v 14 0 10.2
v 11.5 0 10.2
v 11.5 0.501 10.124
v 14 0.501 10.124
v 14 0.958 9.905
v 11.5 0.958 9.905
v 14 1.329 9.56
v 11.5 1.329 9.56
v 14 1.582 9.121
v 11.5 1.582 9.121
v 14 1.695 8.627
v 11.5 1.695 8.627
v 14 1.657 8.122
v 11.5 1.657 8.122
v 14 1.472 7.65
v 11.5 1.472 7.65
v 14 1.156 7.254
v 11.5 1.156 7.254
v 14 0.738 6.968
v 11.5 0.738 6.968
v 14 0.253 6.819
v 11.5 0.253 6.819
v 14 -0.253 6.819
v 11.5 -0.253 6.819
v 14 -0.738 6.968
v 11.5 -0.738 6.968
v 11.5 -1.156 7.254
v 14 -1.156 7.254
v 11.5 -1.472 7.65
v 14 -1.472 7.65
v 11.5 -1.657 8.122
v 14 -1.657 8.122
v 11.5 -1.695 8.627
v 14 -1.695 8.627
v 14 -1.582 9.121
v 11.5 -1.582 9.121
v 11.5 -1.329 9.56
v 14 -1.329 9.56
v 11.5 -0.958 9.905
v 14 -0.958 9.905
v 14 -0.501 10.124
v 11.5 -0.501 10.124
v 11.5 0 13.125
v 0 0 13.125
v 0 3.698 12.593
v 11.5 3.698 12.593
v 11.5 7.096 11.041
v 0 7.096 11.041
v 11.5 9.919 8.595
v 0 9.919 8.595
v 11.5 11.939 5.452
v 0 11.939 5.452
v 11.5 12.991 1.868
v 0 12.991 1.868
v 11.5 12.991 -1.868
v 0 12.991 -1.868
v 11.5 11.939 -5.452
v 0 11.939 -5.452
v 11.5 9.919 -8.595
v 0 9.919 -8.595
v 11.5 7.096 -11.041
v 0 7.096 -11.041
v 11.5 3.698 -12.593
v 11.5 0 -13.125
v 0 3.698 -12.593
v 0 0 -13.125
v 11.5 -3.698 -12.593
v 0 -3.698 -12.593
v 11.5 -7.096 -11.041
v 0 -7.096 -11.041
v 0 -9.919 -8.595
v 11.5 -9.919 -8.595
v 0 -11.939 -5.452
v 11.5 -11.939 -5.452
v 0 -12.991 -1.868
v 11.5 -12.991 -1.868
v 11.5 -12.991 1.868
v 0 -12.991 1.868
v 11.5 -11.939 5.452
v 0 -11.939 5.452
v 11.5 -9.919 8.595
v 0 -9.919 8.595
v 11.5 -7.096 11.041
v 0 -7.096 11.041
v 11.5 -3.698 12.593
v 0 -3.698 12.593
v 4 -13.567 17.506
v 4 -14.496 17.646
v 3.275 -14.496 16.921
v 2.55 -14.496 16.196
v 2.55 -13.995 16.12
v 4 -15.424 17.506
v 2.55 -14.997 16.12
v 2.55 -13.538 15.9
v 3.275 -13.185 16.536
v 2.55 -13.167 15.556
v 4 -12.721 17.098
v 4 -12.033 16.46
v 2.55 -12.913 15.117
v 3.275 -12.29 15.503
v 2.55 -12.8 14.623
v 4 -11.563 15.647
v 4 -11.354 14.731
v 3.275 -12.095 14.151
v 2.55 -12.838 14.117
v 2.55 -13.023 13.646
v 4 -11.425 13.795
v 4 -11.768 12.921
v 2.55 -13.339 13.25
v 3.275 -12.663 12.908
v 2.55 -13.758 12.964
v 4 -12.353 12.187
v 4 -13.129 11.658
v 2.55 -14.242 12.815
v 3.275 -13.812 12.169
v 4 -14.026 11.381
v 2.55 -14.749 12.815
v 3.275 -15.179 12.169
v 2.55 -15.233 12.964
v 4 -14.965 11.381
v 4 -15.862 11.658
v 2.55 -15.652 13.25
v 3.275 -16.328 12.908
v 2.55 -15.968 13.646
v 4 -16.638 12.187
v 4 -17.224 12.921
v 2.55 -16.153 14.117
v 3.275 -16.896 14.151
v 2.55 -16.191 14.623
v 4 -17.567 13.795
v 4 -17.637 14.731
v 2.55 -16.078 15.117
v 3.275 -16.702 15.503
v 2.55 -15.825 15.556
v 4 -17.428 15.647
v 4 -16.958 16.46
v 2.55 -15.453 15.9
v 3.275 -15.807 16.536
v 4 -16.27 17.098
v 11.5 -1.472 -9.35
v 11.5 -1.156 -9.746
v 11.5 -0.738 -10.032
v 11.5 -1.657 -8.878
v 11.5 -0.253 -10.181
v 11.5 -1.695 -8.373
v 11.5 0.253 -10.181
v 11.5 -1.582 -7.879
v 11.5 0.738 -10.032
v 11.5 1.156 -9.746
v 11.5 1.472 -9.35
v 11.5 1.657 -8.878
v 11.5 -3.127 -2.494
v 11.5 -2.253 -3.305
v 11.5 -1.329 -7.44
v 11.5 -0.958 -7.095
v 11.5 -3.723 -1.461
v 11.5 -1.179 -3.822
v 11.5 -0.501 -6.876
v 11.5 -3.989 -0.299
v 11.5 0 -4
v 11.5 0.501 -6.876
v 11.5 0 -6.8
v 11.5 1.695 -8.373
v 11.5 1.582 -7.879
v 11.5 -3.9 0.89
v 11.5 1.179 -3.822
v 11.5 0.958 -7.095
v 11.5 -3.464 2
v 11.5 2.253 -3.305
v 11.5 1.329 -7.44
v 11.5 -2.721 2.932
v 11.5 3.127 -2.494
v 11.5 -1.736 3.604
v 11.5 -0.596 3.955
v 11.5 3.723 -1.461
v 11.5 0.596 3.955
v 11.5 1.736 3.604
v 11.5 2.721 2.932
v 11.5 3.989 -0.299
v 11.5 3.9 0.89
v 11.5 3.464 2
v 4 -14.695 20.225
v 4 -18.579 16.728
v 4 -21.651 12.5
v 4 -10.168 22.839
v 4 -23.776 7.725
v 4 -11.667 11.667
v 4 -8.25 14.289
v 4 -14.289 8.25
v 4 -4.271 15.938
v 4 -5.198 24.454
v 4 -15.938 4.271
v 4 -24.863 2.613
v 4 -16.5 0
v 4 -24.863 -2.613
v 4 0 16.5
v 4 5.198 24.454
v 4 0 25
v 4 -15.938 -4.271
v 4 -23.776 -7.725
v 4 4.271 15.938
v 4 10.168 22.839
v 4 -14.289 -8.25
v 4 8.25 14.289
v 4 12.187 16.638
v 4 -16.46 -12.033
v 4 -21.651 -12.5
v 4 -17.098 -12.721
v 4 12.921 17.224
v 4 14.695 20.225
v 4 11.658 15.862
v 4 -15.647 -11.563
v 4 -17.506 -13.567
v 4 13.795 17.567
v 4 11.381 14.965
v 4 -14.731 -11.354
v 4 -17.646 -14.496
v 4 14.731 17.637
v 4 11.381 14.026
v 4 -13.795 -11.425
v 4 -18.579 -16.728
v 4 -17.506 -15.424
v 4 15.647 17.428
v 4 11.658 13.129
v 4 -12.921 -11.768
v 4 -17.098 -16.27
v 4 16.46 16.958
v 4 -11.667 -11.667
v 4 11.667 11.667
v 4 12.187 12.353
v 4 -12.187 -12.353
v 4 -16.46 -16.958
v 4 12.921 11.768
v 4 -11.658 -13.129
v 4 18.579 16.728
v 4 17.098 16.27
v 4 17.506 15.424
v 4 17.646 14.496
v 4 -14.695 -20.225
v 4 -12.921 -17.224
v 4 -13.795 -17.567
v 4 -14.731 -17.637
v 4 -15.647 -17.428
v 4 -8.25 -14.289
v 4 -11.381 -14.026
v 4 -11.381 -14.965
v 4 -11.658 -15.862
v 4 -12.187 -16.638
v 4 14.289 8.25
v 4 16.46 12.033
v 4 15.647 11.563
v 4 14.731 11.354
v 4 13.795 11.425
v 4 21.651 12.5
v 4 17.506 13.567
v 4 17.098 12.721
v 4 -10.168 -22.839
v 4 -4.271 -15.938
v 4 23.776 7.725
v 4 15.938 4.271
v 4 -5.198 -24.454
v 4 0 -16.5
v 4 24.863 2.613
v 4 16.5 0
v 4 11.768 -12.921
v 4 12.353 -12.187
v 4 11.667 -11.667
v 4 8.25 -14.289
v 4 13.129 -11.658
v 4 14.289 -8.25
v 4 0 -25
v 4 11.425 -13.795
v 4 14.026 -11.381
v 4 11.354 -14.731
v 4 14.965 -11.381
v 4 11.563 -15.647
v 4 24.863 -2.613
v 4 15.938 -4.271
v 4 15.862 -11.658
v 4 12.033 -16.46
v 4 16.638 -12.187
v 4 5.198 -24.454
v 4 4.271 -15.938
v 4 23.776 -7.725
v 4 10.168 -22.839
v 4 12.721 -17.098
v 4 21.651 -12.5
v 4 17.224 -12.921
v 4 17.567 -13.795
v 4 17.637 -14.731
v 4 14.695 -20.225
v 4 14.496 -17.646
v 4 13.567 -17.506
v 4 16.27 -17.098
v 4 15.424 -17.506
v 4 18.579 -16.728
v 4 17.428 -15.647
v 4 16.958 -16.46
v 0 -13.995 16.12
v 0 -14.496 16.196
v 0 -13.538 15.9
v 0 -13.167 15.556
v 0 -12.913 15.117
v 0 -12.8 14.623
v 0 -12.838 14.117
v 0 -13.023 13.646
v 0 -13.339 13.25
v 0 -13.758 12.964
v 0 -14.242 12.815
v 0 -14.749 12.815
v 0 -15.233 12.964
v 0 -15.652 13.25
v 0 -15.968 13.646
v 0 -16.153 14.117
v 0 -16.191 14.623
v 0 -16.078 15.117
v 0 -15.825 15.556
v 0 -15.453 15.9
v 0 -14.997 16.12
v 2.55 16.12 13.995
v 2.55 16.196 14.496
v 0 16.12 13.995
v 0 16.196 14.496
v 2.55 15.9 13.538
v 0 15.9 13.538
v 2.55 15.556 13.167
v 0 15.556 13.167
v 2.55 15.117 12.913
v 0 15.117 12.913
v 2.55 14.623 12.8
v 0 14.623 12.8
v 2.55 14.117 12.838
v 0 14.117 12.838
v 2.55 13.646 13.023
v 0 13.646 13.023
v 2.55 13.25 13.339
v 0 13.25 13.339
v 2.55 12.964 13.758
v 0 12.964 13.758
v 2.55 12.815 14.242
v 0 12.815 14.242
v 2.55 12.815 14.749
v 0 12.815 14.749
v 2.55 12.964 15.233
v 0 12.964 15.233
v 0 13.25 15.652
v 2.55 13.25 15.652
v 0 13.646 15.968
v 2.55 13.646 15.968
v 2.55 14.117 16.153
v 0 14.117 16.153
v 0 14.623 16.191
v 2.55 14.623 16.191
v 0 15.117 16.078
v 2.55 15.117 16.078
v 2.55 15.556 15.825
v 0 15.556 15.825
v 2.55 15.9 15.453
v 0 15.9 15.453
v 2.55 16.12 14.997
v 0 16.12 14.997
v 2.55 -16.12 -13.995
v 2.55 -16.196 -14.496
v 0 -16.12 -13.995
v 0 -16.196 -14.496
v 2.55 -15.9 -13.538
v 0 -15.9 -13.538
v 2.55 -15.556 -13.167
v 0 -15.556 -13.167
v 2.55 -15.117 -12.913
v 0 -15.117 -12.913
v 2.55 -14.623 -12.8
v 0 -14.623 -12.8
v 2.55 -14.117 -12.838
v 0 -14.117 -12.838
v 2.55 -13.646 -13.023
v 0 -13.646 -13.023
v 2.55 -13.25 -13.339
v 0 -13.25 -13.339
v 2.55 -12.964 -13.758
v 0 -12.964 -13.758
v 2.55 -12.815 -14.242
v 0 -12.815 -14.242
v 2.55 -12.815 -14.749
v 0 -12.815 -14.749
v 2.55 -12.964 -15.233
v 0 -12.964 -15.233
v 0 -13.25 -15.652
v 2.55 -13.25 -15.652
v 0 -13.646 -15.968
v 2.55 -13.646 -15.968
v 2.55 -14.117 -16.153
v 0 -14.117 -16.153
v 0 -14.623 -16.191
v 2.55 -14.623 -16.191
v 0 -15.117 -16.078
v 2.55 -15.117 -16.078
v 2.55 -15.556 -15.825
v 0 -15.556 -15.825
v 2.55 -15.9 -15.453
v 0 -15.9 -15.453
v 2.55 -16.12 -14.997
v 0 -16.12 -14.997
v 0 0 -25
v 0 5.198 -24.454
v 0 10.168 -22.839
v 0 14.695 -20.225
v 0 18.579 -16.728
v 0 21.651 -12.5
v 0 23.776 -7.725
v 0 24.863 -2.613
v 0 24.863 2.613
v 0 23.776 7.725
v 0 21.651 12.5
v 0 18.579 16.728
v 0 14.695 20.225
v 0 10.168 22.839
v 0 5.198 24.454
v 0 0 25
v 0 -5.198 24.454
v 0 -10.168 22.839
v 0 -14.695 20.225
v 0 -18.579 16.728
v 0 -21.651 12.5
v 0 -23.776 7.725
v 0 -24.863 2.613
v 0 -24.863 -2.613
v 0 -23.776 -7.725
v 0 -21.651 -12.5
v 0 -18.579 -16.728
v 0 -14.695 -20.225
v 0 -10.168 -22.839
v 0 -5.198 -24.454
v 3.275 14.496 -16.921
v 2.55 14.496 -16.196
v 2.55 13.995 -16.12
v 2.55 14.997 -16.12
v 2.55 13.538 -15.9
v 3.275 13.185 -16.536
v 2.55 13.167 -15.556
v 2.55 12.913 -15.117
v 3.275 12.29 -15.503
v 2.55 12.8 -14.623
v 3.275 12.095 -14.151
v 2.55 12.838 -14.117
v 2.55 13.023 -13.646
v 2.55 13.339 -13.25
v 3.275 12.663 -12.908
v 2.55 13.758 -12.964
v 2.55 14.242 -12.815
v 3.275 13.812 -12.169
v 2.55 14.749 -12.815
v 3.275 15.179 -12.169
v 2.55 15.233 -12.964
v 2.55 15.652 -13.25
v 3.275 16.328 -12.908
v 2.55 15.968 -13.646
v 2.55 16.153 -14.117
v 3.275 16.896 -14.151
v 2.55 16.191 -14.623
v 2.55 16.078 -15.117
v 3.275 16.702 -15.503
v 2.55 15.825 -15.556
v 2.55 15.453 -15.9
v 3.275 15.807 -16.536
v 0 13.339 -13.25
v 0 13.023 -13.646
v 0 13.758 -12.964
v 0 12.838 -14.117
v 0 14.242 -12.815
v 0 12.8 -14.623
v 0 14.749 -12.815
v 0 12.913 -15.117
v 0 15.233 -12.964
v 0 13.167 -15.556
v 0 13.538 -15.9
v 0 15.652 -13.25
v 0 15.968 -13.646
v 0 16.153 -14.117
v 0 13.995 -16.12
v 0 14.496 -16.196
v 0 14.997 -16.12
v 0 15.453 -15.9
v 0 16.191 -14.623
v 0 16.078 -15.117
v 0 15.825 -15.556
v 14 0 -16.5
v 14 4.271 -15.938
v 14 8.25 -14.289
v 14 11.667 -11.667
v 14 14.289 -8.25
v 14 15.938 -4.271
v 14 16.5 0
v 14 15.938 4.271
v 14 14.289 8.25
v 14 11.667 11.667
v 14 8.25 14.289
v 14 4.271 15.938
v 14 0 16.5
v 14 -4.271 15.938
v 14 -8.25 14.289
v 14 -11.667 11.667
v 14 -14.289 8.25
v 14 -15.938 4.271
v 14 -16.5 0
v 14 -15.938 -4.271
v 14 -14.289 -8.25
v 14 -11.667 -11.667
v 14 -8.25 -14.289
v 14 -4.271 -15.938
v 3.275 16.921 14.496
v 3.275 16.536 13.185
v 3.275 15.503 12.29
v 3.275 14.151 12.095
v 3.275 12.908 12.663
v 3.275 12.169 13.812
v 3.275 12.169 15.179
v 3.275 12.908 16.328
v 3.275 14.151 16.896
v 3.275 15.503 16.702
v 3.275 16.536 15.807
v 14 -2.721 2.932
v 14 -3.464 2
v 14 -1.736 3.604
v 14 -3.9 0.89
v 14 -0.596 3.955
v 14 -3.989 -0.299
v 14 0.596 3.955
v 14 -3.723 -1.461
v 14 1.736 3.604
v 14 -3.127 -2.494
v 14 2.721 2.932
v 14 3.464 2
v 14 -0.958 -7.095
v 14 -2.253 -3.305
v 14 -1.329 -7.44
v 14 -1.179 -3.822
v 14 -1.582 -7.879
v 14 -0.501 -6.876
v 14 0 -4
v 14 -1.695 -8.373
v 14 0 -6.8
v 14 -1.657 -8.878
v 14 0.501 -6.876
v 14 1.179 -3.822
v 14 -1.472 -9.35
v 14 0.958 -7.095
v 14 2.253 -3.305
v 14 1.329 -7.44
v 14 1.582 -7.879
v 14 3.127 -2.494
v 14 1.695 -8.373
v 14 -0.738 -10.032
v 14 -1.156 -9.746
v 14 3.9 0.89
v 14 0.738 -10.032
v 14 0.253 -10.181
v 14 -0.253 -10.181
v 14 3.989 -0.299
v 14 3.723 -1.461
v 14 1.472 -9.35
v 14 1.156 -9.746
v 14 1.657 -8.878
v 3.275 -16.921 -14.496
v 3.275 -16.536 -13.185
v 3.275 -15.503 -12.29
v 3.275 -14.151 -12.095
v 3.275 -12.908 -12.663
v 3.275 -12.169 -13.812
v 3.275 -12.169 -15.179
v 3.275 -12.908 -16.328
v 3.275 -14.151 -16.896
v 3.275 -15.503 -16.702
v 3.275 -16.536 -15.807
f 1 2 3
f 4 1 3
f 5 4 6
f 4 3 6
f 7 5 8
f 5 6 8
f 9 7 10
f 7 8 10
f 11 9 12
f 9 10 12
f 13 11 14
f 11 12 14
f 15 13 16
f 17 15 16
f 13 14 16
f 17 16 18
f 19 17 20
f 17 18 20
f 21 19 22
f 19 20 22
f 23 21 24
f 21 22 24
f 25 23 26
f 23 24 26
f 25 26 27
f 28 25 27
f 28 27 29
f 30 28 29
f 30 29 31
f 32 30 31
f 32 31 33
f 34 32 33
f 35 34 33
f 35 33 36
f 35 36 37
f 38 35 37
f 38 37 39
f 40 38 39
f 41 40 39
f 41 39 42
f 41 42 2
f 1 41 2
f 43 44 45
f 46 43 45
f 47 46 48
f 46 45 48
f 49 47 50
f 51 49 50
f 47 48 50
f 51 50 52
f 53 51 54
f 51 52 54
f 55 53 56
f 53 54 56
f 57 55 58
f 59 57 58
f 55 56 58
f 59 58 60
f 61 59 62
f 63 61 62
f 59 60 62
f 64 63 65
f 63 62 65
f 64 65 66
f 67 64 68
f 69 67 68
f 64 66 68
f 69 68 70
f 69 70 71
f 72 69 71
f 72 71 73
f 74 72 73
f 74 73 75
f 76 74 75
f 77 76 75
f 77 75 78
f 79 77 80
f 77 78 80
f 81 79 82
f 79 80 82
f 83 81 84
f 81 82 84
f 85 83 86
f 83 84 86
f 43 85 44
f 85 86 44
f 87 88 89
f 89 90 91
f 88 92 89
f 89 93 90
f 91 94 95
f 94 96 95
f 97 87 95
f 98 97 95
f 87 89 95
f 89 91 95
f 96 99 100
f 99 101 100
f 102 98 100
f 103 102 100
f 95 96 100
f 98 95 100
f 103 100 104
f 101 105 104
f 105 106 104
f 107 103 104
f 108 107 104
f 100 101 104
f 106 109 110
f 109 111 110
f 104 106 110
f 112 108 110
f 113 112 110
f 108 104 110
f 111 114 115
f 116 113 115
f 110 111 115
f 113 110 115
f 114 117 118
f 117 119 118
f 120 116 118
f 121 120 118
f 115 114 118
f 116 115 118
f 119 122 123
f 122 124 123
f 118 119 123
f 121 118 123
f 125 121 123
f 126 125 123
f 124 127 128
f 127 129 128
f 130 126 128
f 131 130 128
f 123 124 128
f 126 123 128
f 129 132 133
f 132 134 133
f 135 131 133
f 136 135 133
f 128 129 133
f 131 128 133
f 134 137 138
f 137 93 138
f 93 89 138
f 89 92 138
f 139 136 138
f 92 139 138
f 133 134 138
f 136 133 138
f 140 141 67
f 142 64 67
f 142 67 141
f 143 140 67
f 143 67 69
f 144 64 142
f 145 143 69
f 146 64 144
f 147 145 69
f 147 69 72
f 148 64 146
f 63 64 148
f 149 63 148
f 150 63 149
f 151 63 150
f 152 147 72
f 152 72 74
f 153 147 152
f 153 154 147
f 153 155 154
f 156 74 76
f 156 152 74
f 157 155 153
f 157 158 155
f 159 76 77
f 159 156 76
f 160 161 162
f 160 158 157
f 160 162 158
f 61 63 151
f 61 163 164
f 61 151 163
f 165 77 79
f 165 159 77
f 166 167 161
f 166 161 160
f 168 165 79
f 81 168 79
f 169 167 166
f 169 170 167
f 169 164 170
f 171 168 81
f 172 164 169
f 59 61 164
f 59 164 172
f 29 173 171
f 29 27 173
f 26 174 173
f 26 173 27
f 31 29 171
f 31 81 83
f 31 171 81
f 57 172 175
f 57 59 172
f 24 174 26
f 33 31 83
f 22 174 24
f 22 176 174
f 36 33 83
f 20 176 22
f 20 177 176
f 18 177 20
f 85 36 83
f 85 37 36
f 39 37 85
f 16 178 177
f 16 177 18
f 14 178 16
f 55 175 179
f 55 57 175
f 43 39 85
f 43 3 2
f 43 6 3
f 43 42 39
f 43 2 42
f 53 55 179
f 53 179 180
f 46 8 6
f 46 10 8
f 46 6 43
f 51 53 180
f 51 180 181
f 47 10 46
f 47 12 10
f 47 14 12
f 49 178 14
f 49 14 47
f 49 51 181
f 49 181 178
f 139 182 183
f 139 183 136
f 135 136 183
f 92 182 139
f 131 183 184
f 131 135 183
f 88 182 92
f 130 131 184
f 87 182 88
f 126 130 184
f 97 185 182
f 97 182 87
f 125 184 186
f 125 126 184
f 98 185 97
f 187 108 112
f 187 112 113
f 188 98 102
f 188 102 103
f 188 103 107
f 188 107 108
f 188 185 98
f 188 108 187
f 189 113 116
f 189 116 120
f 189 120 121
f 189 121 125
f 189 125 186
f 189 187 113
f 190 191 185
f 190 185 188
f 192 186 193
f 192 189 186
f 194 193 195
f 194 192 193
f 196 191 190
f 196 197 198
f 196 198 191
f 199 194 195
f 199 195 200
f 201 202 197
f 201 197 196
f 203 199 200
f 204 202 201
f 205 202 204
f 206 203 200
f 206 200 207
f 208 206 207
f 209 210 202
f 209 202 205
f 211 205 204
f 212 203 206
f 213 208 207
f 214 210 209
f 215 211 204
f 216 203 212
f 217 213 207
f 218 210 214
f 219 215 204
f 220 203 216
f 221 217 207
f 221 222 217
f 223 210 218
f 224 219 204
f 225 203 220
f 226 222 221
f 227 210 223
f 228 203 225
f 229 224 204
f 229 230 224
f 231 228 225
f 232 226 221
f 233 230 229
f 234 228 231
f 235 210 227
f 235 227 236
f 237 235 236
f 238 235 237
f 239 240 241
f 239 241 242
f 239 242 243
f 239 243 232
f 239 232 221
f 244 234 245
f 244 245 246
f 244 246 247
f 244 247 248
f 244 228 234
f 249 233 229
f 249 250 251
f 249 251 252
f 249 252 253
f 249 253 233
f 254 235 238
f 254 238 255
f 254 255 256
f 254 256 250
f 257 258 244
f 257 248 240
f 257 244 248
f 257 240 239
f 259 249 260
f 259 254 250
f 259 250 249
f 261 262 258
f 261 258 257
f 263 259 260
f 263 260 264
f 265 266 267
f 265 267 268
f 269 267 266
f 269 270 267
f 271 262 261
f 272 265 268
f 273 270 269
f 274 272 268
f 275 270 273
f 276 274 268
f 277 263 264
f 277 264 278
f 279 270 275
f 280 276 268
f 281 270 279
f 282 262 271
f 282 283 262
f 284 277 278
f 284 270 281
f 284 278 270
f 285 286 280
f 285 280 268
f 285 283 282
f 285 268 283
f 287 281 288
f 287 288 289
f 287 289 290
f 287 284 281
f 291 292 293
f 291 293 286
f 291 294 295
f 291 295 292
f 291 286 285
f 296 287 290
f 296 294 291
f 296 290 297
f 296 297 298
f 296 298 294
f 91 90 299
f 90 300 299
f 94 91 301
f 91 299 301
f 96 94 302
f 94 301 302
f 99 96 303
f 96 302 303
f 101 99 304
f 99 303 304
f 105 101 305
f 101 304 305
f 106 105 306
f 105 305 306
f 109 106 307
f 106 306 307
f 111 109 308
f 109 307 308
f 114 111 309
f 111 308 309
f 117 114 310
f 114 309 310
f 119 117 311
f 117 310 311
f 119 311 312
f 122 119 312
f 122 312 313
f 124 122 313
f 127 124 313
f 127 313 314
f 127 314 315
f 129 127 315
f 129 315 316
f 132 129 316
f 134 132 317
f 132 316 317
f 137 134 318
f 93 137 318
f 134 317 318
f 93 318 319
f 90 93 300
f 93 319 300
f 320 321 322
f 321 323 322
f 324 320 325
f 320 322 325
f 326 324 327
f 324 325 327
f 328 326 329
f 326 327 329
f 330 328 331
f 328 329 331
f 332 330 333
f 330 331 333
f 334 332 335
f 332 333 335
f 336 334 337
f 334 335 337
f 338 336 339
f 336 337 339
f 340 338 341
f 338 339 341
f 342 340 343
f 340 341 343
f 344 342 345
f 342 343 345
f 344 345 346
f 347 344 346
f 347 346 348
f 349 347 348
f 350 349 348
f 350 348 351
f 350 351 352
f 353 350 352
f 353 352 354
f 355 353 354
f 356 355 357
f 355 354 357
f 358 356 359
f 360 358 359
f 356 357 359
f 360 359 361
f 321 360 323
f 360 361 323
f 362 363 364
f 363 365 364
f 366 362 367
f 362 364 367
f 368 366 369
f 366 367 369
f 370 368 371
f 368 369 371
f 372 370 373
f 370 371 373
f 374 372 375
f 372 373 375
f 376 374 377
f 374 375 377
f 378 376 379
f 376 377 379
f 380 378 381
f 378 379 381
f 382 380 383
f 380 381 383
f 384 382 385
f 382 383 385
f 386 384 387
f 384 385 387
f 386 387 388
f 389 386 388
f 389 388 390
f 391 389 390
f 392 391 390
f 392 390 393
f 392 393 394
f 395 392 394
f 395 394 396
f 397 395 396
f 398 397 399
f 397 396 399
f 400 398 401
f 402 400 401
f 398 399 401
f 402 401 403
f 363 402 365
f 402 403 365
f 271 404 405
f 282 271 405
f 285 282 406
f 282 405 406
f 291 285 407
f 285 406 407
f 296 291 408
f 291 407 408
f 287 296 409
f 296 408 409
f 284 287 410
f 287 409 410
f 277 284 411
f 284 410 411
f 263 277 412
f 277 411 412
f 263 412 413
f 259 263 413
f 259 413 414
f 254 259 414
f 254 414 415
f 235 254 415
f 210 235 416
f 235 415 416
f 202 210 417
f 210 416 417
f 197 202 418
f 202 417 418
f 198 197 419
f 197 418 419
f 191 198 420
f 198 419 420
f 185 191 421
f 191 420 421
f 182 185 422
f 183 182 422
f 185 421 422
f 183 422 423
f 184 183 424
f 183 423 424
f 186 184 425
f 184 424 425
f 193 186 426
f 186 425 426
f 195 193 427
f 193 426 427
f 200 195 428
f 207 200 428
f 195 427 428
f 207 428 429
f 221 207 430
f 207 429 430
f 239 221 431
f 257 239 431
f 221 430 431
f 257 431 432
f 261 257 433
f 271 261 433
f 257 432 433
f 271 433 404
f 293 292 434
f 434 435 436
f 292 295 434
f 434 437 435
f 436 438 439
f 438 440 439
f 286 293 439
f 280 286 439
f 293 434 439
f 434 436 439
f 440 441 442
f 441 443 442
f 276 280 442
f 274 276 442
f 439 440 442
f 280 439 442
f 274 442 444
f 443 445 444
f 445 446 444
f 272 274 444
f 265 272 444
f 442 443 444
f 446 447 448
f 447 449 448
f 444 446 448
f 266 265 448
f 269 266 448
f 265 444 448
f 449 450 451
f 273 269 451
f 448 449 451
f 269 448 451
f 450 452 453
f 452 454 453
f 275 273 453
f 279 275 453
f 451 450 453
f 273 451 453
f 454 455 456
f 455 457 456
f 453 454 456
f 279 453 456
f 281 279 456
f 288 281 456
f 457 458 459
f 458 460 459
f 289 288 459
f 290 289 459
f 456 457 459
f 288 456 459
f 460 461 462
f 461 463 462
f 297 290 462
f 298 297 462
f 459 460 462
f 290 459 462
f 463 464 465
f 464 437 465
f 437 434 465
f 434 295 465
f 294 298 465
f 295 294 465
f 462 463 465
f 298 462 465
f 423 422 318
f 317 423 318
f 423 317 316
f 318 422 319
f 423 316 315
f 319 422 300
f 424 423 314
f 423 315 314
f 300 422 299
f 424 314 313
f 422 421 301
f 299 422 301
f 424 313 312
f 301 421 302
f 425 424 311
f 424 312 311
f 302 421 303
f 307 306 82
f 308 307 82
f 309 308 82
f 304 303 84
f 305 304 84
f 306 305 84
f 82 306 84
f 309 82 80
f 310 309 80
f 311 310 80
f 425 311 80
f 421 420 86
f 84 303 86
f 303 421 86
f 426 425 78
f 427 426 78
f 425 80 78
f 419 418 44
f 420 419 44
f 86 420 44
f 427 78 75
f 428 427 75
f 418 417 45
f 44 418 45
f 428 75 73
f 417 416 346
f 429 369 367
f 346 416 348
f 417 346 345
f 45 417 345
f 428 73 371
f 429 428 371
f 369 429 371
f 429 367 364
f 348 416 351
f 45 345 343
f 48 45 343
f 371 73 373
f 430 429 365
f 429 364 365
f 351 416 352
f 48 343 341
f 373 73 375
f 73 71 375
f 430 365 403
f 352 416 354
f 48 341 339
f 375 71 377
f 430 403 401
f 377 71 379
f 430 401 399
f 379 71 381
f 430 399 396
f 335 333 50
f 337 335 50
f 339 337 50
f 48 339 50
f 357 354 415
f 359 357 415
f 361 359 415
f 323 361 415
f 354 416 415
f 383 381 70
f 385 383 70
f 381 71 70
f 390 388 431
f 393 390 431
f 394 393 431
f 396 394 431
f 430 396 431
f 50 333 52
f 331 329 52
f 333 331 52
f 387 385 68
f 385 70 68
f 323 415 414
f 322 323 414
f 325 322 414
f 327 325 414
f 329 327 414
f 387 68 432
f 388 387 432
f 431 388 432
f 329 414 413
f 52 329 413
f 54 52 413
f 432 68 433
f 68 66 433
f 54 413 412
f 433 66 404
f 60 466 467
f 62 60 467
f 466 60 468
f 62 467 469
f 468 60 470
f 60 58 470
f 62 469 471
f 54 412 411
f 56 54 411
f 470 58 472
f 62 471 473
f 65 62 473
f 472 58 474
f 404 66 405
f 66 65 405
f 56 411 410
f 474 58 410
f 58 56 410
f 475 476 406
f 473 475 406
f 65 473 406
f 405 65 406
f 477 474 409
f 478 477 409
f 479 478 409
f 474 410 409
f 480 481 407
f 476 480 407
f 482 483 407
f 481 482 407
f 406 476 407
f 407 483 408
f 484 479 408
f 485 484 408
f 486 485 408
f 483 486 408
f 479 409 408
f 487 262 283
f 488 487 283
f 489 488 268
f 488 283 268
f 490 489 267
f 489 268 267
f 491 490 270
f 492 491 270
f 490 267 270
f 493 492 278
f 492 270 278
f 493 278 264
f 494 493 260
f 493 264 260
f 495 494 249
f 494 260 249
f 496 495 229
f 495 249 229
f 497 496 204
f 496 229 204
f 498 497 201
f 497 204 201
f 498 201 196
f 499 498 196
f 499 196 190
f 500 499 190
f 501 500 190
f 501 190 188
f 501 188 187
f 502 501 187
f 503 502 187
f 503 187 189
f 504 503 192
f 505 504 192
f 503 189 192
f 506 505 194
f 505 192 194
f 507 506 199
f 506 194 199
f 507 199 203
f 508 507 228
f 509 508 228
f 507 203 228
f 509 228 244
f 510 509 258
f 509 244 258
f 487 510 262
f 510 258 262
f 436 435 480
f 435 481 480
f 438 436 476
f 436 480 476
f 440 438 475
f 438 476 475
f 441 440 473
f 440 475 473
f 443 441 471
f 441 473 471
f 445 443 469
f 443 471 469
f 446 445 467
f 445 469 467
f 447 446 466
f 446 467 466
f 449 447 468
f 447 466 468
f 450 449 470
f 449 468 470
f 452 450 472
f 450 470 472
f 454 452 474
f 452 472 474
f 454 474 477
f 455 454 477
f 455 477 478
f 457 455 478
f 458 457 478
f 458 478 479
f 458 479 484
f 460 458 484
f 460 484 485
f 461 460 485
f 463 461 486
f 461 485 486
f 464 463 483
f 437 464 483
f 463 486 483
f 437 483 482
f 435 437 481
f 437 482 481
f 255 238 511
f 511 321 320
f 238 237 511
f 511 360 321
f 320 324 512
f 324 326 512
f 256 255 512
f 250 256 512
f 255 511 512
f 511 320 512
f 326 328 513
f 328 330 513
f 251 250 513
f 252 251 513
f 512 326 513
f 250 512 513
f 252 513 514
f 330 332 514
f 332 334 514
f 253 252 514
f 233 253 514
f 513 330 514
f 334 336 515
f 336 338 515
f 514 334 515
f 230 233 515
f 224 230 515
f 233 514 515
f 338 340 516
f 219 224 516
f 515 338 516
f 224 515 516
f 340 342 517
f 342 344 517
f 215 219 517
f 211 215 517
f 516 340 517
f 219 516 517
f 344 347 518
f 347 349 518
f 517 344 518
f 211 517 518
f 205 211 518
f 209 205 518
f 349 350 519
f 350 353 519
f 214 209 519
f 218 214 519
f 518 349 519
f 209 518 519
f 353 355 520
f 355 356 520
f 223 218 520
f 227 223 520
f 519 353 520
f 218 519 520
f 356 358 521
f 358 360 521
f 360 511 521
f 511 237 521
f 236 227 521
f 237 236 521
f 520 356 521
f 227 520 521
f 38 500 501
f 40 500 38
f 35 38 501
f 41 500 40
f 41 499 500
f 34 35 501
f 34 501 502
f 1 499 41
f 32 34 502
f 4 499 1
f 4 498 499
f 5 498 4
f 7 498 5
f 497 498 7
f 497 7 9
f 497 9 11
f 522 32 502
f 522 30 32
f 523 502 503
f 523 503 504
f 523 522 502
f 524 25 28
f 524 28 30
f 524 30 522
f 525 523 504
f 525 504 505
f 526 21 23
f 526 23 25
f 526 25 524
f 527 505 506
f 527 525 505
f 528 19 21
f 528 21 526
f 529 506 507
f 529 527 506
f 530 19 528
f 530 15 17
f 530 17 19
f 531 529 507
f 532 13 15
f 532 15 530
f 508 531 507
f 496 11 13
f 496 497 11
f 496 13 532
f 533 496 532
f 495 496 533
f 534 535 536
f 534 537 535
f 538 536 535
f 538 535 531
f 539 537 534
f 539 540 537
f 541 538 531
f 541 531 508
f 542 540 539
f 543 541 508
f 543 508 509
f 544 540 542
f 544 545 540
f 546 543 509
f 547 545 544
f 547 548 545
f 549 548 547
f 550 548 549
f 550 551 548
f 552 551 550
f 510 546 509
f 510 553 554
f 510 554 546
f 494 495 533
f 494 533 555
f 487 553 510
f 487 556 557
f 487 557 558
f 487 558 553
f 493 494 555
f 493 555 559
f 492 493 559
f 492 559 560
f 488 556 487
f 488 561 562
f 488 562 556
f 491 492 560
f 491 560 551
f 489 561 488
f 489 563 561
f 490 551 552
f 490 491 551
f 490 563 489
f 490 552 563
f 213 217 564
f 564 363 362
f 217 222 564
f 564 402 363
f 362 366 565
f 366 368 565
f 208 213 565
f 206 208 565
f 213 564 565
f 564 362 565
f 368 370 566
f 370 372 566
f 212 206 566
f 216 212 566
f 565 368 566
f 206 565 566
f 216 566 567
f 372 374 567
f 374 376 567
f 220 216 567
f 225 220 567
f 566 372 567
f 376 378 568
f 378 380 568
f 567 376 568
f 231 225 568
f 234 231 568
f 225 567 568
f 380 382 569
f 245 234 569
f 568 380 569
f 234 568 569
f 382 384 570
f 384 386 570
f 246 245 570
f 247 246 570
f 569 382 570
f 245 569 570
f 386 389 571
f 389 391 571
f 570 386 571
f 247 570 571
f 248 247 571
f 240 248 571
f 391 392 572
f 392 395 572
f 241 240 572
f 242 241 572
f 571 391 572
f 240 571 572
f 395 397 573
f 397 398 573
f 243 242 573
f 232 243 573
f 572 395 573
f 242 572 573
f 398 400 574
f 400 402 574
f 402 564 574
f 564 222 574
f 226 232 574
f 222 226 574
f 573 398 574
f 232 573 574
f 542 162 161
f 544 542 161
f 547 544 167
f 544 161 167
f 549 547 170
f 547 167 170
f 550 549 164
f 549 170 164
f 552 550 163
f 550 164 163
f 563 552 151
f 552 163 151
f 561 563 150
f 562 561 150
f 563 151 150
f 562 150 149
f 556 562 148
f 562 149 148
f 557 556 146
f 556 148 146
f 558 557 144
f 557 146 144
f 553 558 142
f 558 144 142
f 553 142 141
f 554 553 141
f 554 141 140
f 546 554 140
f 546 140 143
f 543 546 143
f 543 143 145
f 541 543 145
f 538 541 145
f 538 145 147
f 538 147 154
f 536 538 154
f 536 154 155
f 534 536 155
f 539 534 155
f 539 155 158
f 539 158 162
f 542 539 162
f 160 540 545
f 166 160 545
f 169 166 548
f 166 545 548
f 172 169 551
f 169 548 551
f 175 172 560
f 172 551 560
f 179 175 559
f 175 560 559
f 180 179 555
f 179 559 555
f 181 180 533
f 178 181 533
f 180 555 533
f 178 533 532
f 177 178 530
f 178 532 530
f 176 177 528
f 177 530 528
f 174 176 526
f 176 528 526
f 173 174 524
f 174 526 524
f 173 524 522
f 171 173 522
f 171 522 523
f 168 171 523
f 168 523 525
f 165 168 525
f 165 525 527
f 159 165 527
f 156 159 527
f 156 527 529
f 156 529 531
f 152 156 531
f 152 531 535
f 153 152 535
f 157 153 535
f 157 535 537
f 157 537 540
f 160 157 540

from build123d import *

# Parameters (mm, degrees)
SKETCH1_R                                       = 25
BOSS_EXTRUDE1_DEPTH                             = 4
SKETCH2_R                                       = 16.5
BOSS_EXTRUDE2_DEPTH                             = 10
SKETCH3_R                                       = 12.5
CUT_EXTRUDE1_DEPTH                              = 11.5
SKETCH4_R                                       = 4
CUT_EXTRUDE2_DEPTH                              = 4
M3_CLEARANCE_HOLE1_D                            = 3.4
M3_CLEARANCE_HOLE1_DEPTH                        = 10
CSK_FOR_M3_FLAT_HEAD_MACHINE_SCREW1_D           = 3.4
CSK_FOR_M3_FLAT_HEAD_MACHINE_SCREW1_CSINK_D     = 6.3
CSK_FOR_M3_FLAT_HEAD_MACHINE_SCREW1_CSINK_ANGLE = 90
CIRPATTERN1_COUNT                               = 4
SKETCH10_R                                      = 13.125
CUT_EXTRUDE3_DEPTH                              = 11.5


with BuildPart() as part:
    # Sketch1 → Boss-Extrude1 (new body)
    with BuildSketch(Plane(origin=(0, 0, 0), x_dir=(0, 0, -1), z_dir=(1, 0, 0))):
        Circle(SKETCH1_R)
    extrude(amount=BOSS_EXTRUDE1_DEPTH)

    # Sketch2 → Boss-Extrude2 (add)
    with BuildSketch(Plane(origin=(4, 0, 0), x_dir=(0, 0, -1), z_dir=(1, 0, 0))):
        Circle(SKETCH2_R)
    extrude(amount=BOSS_EXTRUDE2_DEPTH)

    # Sketch3 → Cut-Extrude1 (cut)
    with BuildSketch(Plane.ZY):
        Circle(SKETCH3_R)
    extrude(amount=-CUT_EXTRUDE1_DEPTH, mode=Mode.SUBTRACT)

    # Sketch4 → Cut-Extrude2 (cut)
    with BuildSketch(Plane(origin=(14, 0, 0), x_dir=(0, 0, -1), z_dir=(1, 0, 0))):
        Circle(SKETCH4_R)
    extrude(amount=-CUT_EXTRUDE2_DEPTH, mode=Mode.SUBTRACT)

    # M3 Clearance Hole1
    with Locations(Plane(origin=(14, 0, 0), x_dir=(0, 0, -1), z_dir=(1, 0, 0))):
        with Locations((8.5, 0), (-8.5, 0)):
            Hole(M3_CLEARANCE_HOLE1_D / 2, depth=M3_CLEARANCE_HOLE1_DEPTH)

    # CSK for M3 Flat Head Machine Screw1 (through all)
    with Locations(Plane(origin=(4, 0, 0), x_dir=(0, 0, -1), z_dir=(1, 0, 0))):
        with Locations((-14.495689014, -14.495689014)):
            csk_for_m3_flat_head_machine_screw1 = CounterSinkHole(CSK_FOR_M3_FLAT_HEAD_MACHINE_SCREW1_D / 2, CSK_FOR_M3_FLAT_HEAD_MACHINE_SCREW1_CSINK_D / 2, counter_sink_angle=CSK_FOR_M3_FLAT_HEAD_MACHINE_SCREW1_CSINK_ANGLE)

    # CirPattern1: CSK for M3 Flat Head Machine Screw1 ×4 about axis
    cirpattern1_axis = Axis((0, 0, 0), (1, 0, 0))
    for i in range(1, CIRPATTERN1_COUNT):
        add(csk_for_m3_flat_head_machine_screw1.rotate(cirpattern1_axis, i * 360 / CIRPATTERN1_COUNT), mode=Mode.SUBTRACT)

    # Sketch10 → Cut-Extrude3 (cut)
    with BuildSketch(Plane.ZY):
        Circle(SKETCH10_R)
    extrude(amount=-CUT_EXTRUDE3_DEPTH, mode=Mode.SUBTRACT)


solid = part.part
